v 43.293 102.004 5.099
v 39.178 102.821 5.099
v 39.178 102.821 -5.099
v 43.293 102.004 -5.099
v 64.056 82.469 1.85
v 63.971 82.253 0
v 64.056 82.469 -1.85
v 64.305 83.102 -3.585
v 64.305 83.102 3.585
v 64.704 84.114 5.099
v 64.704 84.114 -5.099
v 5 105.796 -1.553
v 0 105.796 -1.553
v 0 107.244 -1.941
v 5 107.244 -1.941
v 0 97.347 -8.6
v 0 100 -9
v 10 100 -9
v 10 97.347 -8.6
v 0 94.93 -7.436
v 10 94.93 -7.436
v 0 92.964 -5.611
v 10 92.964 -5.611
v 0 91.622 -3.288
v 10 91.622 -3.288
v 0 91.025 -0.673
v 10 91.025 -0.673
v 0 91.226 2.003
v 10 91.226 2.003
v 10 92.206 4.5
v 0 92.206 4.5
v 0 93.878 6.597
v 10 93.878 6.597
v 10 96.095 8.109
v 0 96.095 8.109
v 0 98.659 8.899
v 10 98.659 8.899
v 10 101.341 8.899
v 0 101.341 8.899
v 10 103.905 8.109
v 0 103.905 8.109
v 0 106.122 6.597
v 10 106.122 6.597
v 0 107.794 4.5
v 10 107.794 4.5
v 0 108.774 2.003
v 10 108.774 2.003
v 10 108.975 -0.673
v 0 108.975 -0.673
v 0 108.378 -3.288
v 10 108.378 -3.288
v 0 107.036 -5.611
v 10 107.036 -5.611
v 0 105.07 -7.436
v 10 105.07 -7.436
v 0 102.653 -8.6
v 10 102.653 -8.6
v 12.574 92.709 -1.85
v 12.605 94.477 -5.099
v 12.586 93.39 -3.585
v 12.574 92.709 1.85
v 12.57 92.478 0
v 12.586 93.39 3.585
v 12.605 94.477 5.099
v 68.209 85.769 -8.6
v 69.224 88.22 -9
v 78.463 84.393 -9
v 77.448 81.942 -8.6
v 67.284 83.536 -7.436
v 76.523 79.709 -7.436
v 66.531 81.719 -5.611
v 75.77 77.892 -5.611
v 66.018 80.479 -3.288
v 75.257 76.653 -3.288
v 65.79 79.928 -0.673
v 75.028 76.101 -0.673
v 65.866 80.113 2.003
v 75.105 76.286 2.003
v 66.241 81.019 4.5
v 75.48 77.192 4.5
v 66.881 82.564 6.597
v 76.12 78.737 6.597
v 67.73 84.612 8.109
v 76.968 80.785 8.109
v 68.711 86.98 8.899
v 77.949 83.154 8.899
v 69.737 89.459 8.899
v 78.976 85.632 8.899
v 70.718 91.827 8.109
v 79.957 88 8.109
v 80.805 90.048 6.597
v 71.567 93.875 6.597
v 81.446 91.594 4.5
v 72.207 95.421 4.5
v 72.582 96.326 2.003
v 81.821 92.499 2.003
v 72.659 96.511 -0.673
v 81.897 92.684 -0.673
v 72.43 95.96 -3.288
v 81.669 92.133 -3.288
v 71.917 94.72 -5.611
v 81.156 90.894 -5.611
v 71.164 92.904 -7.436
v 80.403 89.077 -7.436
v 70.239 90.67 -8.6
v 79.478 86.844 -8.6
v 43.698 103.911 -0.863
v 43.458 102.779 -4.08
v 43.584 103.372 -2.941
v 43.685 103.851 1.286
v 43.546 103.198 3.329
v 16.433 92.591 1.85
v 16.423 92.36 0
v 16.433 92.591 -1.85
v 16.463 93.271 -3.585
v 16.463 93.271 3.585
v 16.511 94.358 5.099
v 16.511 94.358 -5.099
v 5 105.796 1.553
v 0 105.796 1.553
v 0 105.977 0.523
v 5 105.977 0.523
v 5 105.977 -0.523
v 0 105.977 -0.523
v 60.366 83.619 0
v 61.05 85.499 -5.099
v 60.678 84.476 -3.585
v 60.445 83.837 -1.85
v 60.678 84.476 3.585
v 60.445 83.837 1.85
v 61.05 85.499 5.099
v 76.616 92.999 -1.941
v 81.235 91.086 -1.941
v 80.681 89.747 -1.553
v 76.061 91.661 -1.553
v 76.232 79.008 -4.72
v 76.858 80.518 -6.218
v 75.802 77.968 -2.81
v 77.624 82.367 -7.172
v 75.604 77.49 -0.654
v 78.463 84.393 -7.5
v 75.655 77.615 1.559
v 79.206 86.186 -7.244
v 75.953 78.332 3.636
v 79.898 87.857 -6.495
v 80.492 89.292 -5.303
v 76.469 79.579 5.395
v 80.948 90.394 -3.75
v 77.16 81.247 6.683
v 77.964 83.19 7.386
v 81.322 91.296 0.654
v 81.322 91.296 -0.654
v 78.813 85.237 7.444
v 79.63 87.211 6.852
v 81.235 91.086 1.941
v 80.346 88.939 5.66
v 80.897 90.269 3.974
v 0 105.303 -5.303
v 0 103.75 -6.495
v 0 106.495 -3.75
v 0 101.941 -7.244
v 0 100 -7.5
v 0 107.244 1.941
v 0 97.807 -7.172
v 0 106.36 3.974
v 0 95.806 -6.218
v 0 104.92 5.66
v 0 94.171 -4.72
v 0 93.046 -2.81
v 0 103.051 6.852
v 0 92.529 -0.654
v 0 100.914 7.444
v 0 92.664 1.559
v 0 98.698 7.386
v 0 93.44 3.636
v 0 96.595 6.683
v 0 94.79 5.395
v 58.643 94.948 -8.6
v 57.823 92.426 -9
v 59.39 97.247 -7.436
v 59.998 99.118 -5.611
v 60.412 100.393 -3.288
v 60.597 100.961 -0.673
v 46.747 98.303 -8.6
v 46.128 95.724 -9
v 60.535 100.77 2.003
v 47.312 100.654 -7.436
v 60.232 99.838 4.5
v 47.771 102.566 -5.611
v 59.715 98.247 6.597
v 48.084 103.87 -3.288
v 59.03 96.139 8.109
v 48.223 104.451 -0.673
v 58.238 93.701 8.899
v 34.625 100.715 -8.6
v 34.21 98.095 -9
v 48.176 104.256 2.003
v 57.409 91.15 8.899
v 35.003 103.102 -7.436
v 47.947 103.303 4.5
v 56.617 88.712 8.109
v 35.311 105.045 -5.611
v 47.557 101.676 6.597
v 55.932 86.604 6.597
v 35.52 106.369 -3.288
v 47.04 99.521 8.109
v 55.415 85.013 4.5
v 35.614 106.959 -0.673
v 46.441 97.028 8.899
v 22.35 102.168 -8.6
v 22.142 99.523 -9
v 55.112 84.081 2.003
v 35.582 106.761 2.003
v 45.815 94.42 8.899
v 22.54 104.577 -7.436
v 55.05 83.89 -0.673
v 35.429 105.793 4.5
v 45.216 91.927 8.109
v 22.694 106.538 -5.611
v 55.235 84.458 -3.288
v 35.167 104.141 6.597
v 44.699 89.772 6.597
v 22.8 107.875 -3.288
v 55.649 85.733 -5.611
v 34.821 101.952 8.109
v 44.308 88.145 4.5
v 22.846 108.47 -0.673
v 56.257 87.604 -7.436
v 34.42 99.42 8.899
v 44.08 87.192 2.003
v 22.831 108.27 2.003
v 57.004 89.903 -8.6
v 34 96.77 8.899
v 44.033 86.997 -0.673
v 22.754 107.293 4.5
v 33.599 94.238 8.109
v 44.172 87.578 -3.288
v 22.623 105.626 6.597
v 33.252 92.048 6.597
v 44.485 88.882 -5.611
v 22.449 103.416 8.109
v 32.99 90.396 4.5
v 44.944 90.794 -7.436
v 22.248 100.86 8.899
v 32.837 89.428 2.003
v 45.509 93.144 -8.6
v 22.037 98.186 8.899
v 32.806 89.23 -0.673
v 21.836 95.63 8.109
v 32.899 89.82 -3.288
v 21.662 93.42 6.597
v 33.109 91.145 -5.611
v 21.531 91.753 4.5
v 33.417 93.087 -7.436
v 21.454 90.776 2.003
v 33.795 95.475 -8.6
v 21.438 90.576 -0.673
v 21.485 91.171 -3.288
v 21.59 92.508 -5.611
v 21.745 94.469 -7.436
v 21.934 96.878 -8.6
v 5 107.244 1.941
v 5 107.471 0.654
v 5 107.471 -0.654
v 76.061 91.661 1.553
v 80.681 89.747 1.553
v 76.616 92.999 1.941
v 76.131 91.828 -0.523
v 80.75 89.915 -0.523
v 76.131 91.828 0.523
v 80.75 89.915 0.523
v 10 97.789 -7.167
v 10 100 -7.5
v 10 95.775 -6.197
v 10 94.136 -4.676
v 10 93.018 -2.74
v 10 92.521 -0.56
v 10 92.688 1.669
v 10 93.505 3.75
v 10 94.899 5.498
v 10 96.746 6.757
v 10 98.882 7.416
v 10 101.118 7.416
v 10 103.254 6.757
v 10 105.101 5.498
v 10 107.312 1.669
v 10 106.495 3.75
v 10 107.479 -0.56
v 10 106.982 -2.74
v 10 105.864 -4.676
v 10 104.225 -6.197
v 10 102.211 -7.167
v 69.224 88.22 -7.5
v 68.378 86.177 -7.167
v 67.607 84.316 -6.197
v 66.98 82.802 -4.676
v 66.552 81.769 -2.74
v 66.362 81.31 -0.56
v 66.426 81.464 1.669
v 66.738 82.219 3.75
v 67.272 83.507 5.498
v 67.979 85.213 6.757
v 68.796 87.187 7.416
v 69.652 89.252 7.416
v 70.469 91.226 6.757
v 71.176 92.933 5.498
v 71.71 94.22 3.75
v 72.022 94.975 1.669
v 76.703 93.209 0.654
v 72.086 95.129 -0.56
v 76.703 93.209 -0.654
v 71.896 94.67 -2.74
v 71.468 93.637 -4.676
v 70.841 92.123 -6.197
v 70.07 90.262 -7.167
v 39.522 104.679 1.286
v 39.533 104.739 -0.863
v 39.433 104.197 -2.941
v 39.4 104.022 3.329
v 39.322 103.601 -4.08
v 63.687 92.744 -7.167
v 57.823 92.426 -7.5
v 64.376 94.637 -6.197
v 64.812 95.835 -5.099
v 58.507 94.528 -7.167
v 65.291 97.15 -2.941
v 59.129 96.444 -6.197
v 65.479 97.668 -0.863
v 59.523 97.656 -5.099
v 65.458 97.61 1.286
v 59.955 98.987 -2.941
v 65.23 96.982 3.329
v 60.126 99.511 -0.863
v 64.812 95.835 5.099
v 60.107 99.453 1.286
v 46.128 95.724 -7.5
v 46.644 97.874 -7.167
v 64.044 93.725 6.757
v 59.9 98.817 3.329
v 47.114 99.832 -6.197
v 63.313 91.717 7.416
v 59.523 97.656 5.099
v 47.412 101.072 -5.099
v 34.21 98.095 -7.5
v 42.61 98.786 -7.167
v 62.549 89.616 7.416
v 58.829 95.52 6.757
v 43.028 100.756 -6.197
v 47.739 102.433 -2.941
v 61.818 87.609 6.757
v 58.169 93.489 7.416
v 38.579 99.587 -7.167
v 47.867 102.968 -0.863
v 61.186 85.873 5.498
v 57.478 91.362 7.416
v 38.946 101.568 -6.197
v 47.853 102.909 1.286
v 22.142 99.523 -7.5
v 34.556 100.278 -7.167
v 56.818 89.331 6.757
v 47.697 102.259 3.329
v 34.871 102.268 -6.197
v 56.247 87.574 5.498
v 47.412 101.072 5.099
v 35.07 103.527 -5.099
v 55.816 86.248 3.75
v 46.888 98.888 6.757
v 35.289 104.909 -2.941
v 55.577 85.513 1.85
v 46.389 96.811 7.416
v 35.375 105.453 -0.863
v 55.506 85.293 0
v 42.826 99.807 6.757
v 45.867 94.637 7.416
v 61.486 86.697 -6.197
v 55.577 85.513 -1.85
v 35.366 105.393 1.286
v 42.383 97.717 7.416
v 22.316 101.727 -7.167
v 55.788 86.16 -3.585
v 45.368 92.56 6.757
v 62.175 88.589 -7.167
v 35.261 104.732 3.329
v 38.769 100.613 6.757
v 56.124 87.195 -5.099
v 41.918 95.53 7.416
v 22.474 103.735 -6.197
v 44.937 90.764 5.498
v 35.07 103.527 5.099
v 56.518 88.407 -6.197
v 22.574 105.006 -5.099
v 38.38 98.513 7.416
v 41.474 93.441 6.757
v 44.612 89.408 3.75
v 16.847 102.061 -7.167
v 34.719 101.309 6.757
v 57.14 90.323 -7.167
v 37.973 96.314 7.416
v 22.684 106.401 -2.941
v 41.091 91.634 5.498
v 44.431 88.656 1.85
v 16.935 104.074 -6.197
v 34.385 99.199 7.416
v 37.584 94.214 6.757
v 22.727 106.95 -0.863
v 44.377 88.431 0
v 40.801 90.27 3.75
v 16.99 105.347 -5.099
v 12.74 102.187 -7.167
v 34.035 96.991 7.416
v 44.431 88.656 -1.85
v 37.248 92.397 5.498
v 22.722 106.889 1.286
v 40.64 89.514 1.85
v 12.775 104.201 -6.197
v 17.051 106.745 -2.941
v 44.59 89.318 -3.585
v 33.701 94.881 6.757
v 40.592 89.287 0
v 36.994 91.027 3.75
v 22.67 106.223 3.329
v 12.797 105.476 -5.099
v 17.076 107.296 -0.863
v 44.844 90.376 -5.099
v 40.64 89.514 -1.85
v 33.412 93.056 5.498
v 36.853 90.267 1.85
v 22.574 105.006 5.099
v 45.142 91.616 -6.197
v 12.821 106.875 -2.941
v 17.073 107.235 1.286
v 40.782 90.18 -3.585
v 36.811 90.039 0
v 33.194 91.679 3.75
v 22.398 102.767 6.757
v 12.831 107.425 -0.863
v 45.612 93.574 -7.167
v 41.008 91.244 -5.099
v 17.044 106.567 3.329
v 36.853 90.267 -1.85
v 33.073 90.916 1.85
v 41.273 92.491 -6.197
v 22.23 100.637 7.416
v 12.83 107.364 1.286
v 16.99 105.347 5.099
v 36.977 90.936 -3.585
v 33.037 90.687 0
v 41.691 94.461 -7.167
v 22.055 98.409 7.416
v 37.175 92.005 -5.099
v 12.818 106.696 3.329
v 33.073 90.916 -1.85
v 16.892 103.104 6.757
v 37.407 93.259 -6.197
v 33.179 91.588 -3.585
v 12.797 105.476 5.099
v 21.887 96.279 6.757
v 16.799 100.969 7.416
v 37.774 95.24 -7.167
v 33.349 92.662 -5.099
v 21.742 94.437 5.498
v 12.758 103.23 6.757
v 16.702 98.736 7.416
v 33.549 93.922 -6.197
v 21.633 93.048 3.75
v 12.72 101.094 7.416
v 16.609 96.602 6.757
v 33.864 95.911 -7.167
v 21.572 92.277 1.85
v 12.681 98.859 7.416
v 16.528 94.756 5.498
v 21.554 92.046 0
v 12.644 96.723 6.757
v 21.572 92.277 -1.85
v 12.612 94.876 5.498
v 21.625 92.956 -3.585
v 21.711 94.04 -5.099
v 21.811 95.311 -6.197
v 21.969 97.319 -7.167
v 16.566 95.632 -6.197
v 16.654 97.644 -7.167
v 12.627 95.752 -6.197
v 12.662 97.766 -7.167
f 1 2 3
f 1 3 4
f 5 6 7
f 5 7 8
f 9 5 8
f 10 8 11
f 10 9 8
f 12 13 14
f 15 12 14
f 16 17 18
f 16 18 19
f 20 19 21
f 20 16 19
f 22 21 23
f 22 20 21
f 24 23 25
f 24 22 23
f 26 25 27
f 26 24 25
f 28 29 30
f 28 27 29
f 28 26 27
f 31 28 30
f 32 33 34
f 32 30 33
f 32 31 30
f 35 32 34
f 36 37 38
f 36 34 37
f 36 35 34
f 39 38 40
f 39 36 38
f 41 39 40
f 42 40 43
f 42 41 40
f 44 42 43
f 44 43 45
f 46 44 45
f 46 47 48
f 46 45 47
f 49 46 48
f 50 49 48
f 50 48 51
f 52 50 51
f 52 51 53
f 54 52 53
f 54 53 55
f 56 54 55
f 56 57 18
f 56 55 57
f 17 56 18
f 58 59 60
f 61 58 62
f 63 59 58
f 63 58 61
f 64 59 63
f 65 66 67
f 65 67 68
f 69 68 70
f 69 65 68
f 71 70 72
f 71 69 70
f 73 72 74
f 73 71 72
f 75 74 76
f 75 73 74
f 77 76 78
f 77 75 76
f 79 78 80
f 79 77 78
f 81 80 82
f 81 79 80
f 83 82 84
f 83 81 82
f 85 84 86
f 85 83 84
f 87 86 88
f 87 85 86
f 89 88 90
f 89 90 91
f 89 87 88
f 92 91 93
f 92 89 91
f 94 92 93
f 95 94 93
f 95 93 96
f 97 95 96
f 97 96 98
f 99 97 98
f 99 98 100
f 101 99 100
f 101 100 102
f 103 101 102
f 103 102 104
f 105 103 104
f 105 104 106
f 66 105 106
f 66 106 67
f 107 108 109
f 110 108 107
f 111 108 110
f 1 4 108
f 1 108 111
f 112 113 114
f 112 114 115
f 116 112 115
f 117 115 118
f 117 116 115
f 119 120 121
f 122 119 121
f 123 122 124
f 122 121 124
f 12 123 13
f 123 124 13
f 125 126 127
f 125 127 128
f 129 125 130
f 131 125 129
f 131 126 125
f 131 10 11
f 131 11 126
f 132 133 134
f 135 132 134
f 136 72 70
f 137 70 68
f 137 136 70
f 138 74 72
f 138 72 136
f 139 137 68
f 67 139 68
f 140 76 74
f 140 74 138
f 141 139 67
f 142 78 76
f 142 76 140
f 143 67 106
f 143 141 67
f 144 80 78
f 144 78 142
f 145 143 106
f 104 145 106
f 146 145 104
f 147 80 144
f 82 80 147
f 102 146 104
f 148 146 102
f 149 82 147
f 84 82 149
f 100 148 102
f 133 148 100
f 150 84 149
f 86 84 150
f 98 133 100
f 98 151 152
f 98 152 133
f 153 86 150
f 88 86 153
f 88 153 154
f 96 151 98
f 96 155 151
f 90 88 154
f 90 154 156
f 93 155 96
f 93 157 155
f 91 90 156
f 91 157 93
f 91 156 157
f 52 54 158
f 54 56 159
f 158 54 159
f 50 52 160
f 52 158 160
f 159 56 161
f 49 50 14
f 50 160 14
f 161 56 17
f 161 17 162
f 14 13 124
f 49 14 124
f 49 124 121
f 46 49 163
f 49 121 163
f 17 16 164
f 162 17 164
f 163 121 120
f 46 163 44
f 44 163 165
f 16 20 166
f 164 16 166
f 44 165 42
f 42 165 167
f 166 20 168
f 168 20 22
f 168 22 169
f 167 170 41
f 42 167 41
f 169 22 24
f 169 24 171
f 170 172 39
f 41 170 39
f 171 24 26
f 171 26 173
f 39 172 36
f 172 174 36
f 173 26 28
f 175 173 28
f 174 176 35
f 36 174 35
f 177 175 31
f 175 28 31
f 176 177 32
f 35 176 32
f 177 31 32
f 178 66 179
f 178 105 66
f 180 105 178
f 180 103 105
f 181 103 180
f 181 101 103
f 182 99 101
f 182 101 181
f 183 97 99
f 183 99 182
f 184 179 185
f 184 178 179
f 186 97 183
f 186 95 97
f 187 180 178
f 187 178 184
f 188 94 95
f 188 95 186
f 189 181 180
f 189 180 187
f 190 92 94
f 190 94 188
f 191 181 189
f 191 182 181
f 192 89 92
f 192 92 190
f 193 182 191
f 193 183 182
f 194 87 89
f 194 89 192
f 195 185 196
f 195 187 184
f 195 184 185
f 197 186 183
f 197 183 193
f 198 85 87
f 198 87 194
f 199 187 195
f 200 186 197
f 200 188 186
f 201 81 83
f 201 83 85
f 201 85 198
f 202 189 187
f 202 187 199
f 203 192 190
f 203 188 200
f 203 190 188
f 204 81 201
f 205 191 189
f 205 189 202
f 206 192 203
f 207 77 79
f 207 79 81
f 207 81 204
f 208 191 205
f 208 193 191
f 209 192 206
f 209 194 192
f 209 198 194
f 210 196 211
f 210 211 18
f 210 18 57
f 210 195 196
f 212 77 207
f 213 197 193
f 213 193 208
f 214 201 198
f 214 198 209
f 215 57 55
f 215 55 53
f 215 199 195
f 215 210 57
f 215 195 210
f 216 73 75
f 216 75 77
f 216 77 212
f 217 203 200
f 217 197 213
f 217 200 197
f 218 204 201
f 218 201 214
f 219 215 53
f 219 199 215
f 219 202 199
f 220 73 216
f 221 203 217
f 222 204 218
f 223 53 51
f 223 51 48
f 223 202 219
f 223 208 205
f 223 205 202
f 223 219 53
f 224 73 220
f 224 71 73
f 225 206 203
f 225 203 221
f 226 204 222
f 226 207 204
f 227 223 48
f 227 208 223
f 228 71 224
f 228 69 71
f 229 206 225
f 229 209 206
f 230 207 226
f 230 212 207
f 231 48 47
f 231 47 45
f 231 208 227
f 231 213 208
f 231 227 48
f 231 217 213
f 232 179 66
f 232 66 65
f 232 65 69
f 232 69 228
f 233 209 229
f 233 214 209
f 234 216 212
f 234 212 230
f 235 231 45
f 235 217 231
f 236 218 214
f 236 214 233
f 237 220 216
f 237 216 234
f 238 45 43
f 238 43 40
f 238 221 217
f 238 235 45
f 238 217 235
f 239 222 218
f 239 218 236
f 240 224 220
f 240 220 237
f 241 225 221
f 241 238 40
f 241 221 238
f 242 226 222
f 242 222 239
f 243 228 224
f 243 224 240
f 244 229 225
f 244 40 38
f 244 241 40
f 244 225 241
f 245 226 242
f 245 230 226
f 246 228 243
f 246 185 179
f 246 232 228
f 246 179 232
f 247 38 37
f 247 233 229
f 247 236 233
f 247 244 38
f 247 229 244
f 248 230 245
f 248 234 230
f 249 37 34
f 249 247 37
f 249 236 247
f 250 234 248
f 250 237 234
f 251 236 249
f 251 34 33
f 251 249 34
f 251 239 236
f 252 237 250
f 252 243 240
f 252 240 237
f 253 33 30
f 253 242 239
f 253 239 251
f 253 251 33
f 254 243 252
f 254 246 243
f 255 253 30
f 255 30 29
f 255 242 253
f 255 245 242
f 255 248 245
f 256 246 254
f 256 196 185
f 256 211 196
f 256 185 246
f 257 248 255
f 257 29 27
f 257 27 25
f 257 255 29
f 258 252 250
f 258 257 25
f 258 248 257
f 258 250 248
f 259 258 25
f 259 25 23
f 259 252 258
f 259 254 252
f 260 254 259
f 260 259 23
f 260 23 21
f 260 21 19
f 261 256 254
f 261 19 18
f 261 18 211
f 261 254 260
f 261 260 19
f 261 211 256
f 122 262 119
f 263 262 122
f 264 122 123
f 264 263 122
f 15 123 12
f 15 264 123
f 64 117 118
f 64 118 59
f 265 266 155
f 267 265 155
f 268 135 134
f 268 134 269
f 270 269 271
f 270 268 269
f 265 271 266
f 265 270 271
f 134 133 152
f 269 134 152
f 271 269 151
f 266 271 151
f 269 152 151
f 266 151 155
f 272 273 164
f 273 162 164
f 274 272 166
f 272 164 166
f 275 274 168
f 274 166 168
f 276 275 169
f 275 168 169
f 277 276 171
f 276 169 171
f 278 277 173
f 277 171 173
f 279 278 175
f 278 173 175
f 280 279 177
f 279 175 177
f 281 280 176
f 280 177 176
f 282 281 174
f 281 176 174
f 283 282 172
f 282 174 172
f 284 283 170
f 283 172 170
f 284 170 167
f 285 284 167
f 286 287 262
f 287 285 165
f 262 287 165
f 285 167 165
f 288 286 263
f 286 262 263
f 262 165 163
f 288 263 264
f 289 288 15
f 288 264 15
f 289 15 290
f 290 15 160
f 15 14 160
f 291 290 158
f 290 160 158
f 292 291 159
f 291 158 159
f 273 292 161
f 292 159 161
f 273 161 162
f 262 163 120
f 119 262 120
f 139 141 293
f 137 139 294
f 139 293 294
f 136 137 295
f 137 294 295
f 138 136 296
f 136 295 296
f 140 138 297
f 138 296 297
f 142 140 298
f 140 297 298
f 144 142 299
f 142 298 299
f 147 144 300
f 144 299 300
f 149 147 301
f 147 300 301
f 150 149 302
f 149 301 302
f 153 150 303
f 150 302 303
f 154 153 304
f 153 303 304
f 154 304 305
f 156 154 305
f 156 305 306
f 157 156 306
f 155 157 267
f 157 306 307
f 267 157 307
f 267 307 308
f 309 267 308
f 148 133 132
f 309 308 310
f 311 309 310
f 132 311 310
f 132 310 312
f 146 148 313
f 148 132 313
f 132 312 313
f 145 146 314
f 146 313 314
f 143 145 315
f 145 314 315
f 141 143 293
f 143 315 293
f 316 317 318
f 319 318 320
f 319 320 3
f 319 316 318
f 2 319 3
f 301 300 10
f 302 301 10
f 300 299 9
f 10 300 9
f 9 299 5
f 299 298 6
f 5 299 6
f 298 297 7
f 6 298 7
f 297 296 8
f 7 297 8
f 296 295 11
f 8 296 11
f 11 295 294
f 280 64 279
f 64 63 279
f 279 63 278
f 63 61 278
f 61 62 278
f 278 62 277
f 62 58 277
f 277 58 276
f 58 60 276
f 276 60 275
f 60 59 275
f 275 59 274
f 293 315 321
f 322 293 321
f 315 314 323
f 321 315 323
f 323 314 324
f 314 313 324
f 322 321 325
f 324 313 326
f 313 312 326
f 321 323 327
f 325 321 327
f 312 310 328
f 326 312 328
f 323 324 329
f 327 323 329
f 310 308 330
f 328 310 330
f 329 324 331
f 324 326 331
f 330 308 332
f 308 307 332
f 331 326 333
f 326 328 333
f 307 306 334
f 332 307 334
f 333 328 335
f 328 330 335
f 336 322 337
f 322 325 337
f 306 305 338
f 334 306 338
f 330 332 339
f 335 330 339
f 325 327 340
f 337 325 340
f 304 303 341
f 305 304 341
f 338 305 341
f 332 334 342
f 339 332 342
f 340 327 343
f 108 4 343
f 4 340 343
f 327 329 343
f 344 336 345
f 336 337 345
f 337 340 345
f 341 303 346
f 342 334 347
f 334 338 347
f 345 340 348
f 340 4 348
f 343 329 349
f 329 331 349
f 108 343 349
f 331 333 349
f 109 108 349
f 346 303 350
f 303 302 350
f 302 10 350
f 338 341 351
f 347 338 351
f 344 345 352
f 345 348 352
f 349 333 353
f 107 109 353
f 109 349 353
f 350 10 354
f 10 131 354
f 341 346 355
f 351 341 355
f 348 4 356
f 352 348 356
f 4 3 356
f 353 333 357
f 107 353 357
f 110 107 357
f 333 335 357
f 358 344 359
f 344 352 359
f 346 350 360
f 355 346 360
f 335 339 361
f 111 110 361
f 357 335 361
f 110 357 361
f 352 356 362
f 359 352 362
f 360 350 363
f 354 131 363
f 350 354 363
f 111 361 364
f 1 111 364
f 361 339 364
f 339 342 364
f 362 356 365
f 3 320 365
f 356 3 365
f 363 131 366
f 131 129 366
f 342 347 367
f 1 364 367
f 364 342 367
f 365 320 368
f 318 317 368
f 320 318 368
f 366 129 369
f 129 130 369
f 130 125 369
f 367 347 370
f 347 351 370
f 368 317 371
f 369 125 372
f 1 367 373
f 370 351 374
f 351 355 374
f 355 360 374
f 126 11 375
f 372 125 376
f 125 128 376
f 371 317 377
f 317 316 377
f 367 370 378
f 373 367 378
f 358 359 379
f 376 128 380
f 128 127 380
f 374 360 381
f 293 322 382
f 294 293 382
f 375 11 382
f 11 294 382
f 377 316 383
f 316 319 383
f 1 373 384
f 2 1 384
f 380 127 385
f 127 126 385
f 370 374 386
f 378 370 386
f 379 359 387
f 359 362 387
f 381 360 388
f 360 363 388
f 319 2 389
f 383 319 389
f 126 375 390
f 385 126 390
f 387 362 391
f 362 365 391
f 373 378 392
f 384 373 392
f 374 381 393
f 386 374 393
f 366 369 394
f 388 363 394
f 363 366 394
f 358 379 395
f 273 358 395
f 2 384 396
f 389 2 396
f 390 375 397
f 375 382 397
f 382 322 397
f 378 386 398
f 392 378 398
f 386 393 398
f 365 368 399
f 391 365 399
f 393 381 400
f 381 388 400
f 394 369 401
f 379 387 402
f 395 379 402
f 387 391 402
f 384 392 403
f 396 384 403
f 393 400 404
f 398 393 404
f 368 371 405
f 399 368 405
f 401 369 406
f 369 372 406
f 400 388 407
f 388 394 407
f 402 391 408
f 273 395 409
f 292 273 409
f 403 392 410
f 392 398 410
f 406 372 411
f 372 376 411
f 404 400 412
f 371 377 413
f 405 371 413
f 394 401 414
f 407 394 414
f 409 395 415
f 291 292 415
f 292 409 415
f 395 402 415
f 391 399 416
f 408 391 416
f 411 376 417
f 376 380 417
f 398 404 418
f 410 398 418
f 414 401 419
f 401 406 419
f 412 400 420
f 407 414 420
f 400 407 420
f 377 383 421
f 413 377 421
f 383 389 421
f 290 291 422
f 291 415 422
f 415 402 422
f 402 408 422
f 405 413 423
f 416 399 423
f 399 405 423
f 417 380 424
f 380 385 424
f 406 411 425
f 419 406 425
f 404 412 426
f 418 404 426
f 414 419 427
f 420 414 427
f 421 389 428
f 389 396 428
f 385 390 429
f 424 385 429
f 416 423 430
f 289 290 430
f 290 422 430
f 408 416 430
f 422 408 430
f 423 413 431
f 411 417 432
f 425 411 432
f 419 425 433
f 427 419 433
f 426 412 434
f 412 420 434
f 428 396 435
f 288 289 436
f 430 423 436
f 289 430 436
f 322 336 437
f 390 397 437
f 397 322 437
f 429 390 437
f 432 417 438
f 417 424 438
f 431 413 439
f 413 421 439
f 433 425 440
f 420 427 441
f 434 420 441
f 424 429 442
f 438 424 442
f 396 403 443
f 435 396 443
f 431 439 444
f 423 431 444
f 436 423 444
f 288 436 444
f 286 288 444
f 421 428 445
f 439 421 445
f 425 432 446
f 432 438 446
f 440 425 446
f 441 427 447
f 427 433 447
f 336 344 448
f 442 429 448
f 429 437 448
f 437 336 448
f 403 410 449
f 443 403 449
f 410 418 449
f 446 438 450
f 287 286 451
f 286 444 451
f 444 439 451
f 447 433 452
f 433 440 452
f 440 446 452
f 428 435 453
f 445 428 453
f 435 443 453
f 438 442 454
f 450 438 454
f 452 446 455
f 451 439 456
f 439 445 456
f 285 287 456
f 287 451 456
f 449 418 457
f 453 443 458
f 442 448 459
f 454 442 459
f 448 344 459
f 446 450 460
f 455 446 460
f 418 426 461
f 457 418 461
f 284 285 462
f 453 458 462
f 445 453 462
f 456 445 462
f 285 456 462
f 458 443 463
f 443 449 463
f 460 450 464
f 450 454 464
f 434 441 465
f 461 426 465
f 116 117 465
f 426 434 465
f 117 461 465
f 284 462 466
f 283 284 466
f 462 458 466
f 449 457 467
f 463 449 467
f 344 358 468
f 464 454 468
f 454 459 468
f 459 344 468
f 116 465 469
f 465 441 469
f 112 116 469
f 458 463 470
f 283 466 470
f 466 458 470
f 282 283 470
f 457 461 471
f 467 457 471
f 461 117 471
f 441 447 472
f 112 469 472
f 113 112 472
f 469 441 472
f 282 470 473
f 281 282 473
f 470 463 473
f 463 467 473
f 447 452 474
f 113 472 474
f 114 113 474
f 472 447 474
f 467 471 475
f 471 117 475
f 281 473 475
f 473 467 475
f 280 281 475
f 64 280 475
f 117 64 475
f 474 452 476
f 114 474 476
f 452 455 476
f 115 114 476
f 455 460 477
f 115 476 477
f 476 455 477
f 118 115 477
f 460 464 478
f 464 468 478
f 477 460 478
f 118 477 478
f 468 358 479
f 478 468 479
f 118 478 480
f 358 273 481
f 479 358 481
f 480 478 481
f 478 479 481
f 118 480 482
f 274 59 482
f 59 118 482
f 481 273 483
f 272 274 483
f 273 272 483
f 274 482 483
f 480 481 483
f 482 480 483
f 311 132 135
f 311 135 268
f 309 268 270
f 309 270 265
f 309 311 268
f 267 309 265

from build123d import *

# Parameters (mm, degrees)
SKETCH3_R                                  = 9
SKETCH3_R_2                                = 7.5
BOSS_EXTRUDE3_START                        = -5
BOSS_EXTRUDE3_DEPTH                        = 5
BOSS_EXTRUDE4_DEPTH                        = 5
BOSS_EXTRUDE5_REACH                        = 138.641
BOSS_EXTRUDE5_END_MAJOR_RADIUS             = 154.759840898
BOSS_EXTRUDE5_END_MINOR_RADIUS             = 7.5
BOSS_EXTRUDE5_DIRECTION_2_REACH            = 138.641
BOSS_EXTRUDE5_DIRECTION_2_END_MAJOR_RADIUS = 154.759840898
BOSS_EXTRUDE5_DIRECTION_2_END_MINOR_RADIUS = 7.5


with BuildPart() as part:
    # Sweep1: sweep along a path in Sketch2path
    with BuildLine(Plane.XY) as sweep1_path:
        Line((78.462822432, 84.392774239), (69.224027107, 88.219608562))
        ThreePointArc((69.224027107, 88.219608562), (40.192147196, 97.026333052), (10, 100))
        Line((10, 100), (0, 100))
    # Sketch3 → Sweep1 (sweep)
    with BuildSketch(Plane(origin=(0, 0, 0), x_dir=(0, 0, -1), z_dir=(1, 0, 0))):
        with Locations((0, 100)):
            Circle(SKETCH3_R)
        with Locations((0, 100)):
            Circle(SKETCH3_R_2, mode=Mode.SUBTRACT)
    sweep(path=sweep1_path.line)

    # Sketch9 → Boss-Extrude3 (add)
    with BuildSketch(Plane(origin=(37.134856649, -15.381761261, 0), x_dir=(0, 0, -1), z_dir=(0.9238795325112893, -0.3826834323650841, 0)).offset(BOSS_EXTRUDE3_START)):
        with BuildLine():
            Line((-1.552914271, 113.79073397), (-1.941142838, 115.23962271))
            ThreePointArc((-1.941142838, 115.23962271), (0, 115.495179012), (1.941142838, 115.23962271))
            Line((1.941142838, 115.23962271), (1.552914271, 113.79073397))
            ThreePointArc((1.552914271, 113.79073397), (0, 113.995179012), (-1.552914271, 113.79073397))
        make_face()
    extrude(amount=BOSS_EXTRUDE3_DEPTH)

    # Sketch10 → Boss-Extrude4 (add)
    with BuildSketch(Plane.ZY):
        with BuildLine():
            Line((-1.552914271, 105.795554958), (-1.941142838, 107.244443697))
            ThreePointArc((-1.941142838, 107.244443697), (0, 107.5), (1.941142838, 107.244443697))
            Line((1.941142838, 107.244443697), (1.552914271, 105.795554958))
            ThreePointArc((1.552914271, 105.795554958), (0, 106), (-1.552914271, 105.795554958))
        make_face()
    extrude(amount=-BOSS_EXTRUDE4_DEPTH)

    # Boss-Extrude5: up to this torus (the profile starts inside it)
    boss_extrude5_end = Plane(origin=(10, -54.759840898, 0), z_dir=(0, 0, -1)) * Torus(BOSS_EXTRUDE5_END_MAJOR_RADIUS, BOSS_EXTRUDE5_END_MINOR_RADIUS, mode=Mode.PRIVATE)
    # Sketch12 → Boss-Extrude5 (add, up to the surface)
    with BuildSketch(Plane.XY, mode=Mode.PRIVATE) as boss_extrude5_sk1:
        with BuildLine():
            Line((12.604943408, 94.477267003), (12.570038595, 92.477571613))
            ThreePointArc((12.570038595, 92.477571613), (14.497096597, 92.431316661), (16.423384043, 92.359841262))
            Line((16.423384043, 92.359841262), (16.510622818, 94.357937705))
            ThreePointArc((16.510622818, 94.357937705), (14.558173623, 94.430383842), (12.604943408, 94.477267003))
        make_face()
    boss_extrude5_tool1 = extrude(boss_extrude5_sk1.sketch, amount=BOSS_EXTRUDE5_REACH, mode=Mode.PRIVATE) & boss_extrude5_end
    add(boss_extrude5_tool1.solids().sort_by_distance((14.527574, 93.428865, 0))[0])
    # Sketch12 → Boss-Extrude5 (add, up to the surface)
    with BuildSketch(Plane.XY, mode=Mode.PRIVATE) as boss_extrude5_sk2:
        with BuildLine():
            ThreePointArc((60.36583189, 83.619144932), (62.172841887, 82.948021298), (63.970912336, 82.253302132))
            Line((63.970912336, 82.253302132), (64.70391479, 84.114137268))
            ThreePointArc((64.70391479, 84.114137268), (62.881423963, 84.818291718), (61.049872177, 85.498530174))
            Line((61.049872177, 85.498530174), (60.36583189, 83.619144932))
        make_face()
    boss_extrude5_tool2 = extrude(boss_extrude5_sk2.sketch, amount=BOSS_EXTRUDE5_REACH, mode=Mode.PRIVATE) & boss_extrude5_end
    add(boss_extrude5_tool2.solids().sort_by_distance((62.526429, 83.8813, 0))[0])
    # Sketch12 → Boss-Extrude5 (add, up to the surface)
    with BuildSketch(Plane.XY, mode=Mode.PRIVATE) as boss_extrude5_sk3:
        with BuildLine():
            ThreePointArc((43.708421499, 103.960032742), (41.627954662, 104.38766443), (39.542068537, 104.788027012))
            Line((39.542068537, 104.788027012), (39.177935695, 102.821454544))
            ThreePointArc((39.177935695, 102.821454544), (41.238111377, 102.426026794), (43.29293457, 102.003666055))
            Line((43.29293457, 102.003666055), (43.708421499, 103.960032742))
        make_face()
    boss_extrude5_tool3 = extrude(boss_extrude5_sk3.sketch, amount=BOSS_EXTRUDE5_REACH, mode=Mode.PRIVATE) & boss_extrude5_end
    add(boss_extrude5_tool3.solids().sort_by_distance((41.432538, 103.404356, 0))[0])

    # Boss-Extrude5 direction 2: up to this torus (the profile starts inside it)
    boss_extrude5_direction_2_end = Plane(origin=(10, -54.759840898, 0), z_dir=(0, 0, -1)) * Torus(BOSS_EXTRUDE5_DIRECTION_2_END_MAJOR_RADIUS, BOSS_EXTRUDE5_DIRECTION_2_END_MINOR_RADIUS, mode=Mode.PRIVATE)
    # Sketch12 → Boss-Extrude5 direction 2 (add, up to the surface)
    with BuildSketch(Plane.XY, mode=Mode.PRIVATE) as boss_extrude5_direction_2_sk1:
        with BuildLine():
            Line((12.604943408, 94.477267003), (12.570038595, 92.477571613))
            ThreePointArc((12.570038595, 92.477571613), (14.497096597, 92.431316661), (16.423384043, 92.359841262))
            Line((16.423384043, 92.359841262), (16.510622818, 94.357937705))
            ThreePointArc((16.510622818, 94.357937705), (14.558173623, 94.430383842), (12.604943408, 94.477267003))
        make_face()
    boss_extrude5_direction_2_tool1 = extrude(boss_extrude5_direction_2_sk1.sketch, amount=-BOSS_EXTRUDE5_DIRECTION_2_REACH, mode=Mode.PRIVATE) & boss_extrude5_direction_2_end
    add(boss_extrude5_direction_2_tool1.solids().sort_by_distance((14.527574, 93.428865, 0))[0])
    # Sketch12 → Boss-Extrude5 direction 2 (add, up to the surface)
    with BuildSketch(Plane.XY, mode=Mode.PRIVATE) as boss_extrude5_direction_2_sk2:
        with BuildLine():
            ThreePointArc((60.36583189, 83.619144932), (62.172841887, 82.948021298), (63.970912336, 82.253302132))
            Line((63.970912336, 82.253302132), (64.70391479, 84.114137268))
            ThreePointArc((64.70391479, 84.114137268), (62.881423963, 84.818291718), (61.049872177, 85.498530174))
            Line((61.049872177, 85.498530174), (60.36583189, 83.619144932))
        make_face()
    boss_extrude5_direction_2_tool2 = extrude(boss_extrude5_direction_2_sk2.sketch, amount=-BOSS_EXTRUDE5_DIRECTION_2_REACH, mode=Mode.PRIVATE) & boss_extrude5_direction_2_end
    add(boss_extrude5_direction_2_tool2.solids().sort_by_distance((62.526429, 83.8813, 0))[0])
    # Sketch12 → Boss-Extrude5 direction 2 (add, up to the surface)
    with BuildSketch(Plane.XY, mode=Mode.PRIVATE) as boss_extrude5_direction_2_sk3:
        with BuildLine():
            ThreePointArc((43.708421499, 103.960032742), (41.627954662, 104.38766443), (39.542068537, 104.788027012))
            Line((39.542068537, 104.788027012), (39.177935695, 102.821454544))
            ThreePointArc((39.177935695, 102.821454544), (41.238111377, 102.426026794), (43.29293457, 102.003666055))
            Line((43.29293457, 102.003666055), (43.708421499, 103.960032742))
        make_face()
    boss_extrude5_direction_2_tool3 = extrude(boss_extrude5_direction_2_sk3.sketch, amount=-BOSS_EXTRUDE5_DIRECTION_2_REACH, mode=Mode.PRIVATE) & boss_extrude5_direction_2_end
    add(boss_extrude5_direction_2_tool3.solids().sort_by_distance((41.432538, 103.404356, 0))[0])


solid = part.part
